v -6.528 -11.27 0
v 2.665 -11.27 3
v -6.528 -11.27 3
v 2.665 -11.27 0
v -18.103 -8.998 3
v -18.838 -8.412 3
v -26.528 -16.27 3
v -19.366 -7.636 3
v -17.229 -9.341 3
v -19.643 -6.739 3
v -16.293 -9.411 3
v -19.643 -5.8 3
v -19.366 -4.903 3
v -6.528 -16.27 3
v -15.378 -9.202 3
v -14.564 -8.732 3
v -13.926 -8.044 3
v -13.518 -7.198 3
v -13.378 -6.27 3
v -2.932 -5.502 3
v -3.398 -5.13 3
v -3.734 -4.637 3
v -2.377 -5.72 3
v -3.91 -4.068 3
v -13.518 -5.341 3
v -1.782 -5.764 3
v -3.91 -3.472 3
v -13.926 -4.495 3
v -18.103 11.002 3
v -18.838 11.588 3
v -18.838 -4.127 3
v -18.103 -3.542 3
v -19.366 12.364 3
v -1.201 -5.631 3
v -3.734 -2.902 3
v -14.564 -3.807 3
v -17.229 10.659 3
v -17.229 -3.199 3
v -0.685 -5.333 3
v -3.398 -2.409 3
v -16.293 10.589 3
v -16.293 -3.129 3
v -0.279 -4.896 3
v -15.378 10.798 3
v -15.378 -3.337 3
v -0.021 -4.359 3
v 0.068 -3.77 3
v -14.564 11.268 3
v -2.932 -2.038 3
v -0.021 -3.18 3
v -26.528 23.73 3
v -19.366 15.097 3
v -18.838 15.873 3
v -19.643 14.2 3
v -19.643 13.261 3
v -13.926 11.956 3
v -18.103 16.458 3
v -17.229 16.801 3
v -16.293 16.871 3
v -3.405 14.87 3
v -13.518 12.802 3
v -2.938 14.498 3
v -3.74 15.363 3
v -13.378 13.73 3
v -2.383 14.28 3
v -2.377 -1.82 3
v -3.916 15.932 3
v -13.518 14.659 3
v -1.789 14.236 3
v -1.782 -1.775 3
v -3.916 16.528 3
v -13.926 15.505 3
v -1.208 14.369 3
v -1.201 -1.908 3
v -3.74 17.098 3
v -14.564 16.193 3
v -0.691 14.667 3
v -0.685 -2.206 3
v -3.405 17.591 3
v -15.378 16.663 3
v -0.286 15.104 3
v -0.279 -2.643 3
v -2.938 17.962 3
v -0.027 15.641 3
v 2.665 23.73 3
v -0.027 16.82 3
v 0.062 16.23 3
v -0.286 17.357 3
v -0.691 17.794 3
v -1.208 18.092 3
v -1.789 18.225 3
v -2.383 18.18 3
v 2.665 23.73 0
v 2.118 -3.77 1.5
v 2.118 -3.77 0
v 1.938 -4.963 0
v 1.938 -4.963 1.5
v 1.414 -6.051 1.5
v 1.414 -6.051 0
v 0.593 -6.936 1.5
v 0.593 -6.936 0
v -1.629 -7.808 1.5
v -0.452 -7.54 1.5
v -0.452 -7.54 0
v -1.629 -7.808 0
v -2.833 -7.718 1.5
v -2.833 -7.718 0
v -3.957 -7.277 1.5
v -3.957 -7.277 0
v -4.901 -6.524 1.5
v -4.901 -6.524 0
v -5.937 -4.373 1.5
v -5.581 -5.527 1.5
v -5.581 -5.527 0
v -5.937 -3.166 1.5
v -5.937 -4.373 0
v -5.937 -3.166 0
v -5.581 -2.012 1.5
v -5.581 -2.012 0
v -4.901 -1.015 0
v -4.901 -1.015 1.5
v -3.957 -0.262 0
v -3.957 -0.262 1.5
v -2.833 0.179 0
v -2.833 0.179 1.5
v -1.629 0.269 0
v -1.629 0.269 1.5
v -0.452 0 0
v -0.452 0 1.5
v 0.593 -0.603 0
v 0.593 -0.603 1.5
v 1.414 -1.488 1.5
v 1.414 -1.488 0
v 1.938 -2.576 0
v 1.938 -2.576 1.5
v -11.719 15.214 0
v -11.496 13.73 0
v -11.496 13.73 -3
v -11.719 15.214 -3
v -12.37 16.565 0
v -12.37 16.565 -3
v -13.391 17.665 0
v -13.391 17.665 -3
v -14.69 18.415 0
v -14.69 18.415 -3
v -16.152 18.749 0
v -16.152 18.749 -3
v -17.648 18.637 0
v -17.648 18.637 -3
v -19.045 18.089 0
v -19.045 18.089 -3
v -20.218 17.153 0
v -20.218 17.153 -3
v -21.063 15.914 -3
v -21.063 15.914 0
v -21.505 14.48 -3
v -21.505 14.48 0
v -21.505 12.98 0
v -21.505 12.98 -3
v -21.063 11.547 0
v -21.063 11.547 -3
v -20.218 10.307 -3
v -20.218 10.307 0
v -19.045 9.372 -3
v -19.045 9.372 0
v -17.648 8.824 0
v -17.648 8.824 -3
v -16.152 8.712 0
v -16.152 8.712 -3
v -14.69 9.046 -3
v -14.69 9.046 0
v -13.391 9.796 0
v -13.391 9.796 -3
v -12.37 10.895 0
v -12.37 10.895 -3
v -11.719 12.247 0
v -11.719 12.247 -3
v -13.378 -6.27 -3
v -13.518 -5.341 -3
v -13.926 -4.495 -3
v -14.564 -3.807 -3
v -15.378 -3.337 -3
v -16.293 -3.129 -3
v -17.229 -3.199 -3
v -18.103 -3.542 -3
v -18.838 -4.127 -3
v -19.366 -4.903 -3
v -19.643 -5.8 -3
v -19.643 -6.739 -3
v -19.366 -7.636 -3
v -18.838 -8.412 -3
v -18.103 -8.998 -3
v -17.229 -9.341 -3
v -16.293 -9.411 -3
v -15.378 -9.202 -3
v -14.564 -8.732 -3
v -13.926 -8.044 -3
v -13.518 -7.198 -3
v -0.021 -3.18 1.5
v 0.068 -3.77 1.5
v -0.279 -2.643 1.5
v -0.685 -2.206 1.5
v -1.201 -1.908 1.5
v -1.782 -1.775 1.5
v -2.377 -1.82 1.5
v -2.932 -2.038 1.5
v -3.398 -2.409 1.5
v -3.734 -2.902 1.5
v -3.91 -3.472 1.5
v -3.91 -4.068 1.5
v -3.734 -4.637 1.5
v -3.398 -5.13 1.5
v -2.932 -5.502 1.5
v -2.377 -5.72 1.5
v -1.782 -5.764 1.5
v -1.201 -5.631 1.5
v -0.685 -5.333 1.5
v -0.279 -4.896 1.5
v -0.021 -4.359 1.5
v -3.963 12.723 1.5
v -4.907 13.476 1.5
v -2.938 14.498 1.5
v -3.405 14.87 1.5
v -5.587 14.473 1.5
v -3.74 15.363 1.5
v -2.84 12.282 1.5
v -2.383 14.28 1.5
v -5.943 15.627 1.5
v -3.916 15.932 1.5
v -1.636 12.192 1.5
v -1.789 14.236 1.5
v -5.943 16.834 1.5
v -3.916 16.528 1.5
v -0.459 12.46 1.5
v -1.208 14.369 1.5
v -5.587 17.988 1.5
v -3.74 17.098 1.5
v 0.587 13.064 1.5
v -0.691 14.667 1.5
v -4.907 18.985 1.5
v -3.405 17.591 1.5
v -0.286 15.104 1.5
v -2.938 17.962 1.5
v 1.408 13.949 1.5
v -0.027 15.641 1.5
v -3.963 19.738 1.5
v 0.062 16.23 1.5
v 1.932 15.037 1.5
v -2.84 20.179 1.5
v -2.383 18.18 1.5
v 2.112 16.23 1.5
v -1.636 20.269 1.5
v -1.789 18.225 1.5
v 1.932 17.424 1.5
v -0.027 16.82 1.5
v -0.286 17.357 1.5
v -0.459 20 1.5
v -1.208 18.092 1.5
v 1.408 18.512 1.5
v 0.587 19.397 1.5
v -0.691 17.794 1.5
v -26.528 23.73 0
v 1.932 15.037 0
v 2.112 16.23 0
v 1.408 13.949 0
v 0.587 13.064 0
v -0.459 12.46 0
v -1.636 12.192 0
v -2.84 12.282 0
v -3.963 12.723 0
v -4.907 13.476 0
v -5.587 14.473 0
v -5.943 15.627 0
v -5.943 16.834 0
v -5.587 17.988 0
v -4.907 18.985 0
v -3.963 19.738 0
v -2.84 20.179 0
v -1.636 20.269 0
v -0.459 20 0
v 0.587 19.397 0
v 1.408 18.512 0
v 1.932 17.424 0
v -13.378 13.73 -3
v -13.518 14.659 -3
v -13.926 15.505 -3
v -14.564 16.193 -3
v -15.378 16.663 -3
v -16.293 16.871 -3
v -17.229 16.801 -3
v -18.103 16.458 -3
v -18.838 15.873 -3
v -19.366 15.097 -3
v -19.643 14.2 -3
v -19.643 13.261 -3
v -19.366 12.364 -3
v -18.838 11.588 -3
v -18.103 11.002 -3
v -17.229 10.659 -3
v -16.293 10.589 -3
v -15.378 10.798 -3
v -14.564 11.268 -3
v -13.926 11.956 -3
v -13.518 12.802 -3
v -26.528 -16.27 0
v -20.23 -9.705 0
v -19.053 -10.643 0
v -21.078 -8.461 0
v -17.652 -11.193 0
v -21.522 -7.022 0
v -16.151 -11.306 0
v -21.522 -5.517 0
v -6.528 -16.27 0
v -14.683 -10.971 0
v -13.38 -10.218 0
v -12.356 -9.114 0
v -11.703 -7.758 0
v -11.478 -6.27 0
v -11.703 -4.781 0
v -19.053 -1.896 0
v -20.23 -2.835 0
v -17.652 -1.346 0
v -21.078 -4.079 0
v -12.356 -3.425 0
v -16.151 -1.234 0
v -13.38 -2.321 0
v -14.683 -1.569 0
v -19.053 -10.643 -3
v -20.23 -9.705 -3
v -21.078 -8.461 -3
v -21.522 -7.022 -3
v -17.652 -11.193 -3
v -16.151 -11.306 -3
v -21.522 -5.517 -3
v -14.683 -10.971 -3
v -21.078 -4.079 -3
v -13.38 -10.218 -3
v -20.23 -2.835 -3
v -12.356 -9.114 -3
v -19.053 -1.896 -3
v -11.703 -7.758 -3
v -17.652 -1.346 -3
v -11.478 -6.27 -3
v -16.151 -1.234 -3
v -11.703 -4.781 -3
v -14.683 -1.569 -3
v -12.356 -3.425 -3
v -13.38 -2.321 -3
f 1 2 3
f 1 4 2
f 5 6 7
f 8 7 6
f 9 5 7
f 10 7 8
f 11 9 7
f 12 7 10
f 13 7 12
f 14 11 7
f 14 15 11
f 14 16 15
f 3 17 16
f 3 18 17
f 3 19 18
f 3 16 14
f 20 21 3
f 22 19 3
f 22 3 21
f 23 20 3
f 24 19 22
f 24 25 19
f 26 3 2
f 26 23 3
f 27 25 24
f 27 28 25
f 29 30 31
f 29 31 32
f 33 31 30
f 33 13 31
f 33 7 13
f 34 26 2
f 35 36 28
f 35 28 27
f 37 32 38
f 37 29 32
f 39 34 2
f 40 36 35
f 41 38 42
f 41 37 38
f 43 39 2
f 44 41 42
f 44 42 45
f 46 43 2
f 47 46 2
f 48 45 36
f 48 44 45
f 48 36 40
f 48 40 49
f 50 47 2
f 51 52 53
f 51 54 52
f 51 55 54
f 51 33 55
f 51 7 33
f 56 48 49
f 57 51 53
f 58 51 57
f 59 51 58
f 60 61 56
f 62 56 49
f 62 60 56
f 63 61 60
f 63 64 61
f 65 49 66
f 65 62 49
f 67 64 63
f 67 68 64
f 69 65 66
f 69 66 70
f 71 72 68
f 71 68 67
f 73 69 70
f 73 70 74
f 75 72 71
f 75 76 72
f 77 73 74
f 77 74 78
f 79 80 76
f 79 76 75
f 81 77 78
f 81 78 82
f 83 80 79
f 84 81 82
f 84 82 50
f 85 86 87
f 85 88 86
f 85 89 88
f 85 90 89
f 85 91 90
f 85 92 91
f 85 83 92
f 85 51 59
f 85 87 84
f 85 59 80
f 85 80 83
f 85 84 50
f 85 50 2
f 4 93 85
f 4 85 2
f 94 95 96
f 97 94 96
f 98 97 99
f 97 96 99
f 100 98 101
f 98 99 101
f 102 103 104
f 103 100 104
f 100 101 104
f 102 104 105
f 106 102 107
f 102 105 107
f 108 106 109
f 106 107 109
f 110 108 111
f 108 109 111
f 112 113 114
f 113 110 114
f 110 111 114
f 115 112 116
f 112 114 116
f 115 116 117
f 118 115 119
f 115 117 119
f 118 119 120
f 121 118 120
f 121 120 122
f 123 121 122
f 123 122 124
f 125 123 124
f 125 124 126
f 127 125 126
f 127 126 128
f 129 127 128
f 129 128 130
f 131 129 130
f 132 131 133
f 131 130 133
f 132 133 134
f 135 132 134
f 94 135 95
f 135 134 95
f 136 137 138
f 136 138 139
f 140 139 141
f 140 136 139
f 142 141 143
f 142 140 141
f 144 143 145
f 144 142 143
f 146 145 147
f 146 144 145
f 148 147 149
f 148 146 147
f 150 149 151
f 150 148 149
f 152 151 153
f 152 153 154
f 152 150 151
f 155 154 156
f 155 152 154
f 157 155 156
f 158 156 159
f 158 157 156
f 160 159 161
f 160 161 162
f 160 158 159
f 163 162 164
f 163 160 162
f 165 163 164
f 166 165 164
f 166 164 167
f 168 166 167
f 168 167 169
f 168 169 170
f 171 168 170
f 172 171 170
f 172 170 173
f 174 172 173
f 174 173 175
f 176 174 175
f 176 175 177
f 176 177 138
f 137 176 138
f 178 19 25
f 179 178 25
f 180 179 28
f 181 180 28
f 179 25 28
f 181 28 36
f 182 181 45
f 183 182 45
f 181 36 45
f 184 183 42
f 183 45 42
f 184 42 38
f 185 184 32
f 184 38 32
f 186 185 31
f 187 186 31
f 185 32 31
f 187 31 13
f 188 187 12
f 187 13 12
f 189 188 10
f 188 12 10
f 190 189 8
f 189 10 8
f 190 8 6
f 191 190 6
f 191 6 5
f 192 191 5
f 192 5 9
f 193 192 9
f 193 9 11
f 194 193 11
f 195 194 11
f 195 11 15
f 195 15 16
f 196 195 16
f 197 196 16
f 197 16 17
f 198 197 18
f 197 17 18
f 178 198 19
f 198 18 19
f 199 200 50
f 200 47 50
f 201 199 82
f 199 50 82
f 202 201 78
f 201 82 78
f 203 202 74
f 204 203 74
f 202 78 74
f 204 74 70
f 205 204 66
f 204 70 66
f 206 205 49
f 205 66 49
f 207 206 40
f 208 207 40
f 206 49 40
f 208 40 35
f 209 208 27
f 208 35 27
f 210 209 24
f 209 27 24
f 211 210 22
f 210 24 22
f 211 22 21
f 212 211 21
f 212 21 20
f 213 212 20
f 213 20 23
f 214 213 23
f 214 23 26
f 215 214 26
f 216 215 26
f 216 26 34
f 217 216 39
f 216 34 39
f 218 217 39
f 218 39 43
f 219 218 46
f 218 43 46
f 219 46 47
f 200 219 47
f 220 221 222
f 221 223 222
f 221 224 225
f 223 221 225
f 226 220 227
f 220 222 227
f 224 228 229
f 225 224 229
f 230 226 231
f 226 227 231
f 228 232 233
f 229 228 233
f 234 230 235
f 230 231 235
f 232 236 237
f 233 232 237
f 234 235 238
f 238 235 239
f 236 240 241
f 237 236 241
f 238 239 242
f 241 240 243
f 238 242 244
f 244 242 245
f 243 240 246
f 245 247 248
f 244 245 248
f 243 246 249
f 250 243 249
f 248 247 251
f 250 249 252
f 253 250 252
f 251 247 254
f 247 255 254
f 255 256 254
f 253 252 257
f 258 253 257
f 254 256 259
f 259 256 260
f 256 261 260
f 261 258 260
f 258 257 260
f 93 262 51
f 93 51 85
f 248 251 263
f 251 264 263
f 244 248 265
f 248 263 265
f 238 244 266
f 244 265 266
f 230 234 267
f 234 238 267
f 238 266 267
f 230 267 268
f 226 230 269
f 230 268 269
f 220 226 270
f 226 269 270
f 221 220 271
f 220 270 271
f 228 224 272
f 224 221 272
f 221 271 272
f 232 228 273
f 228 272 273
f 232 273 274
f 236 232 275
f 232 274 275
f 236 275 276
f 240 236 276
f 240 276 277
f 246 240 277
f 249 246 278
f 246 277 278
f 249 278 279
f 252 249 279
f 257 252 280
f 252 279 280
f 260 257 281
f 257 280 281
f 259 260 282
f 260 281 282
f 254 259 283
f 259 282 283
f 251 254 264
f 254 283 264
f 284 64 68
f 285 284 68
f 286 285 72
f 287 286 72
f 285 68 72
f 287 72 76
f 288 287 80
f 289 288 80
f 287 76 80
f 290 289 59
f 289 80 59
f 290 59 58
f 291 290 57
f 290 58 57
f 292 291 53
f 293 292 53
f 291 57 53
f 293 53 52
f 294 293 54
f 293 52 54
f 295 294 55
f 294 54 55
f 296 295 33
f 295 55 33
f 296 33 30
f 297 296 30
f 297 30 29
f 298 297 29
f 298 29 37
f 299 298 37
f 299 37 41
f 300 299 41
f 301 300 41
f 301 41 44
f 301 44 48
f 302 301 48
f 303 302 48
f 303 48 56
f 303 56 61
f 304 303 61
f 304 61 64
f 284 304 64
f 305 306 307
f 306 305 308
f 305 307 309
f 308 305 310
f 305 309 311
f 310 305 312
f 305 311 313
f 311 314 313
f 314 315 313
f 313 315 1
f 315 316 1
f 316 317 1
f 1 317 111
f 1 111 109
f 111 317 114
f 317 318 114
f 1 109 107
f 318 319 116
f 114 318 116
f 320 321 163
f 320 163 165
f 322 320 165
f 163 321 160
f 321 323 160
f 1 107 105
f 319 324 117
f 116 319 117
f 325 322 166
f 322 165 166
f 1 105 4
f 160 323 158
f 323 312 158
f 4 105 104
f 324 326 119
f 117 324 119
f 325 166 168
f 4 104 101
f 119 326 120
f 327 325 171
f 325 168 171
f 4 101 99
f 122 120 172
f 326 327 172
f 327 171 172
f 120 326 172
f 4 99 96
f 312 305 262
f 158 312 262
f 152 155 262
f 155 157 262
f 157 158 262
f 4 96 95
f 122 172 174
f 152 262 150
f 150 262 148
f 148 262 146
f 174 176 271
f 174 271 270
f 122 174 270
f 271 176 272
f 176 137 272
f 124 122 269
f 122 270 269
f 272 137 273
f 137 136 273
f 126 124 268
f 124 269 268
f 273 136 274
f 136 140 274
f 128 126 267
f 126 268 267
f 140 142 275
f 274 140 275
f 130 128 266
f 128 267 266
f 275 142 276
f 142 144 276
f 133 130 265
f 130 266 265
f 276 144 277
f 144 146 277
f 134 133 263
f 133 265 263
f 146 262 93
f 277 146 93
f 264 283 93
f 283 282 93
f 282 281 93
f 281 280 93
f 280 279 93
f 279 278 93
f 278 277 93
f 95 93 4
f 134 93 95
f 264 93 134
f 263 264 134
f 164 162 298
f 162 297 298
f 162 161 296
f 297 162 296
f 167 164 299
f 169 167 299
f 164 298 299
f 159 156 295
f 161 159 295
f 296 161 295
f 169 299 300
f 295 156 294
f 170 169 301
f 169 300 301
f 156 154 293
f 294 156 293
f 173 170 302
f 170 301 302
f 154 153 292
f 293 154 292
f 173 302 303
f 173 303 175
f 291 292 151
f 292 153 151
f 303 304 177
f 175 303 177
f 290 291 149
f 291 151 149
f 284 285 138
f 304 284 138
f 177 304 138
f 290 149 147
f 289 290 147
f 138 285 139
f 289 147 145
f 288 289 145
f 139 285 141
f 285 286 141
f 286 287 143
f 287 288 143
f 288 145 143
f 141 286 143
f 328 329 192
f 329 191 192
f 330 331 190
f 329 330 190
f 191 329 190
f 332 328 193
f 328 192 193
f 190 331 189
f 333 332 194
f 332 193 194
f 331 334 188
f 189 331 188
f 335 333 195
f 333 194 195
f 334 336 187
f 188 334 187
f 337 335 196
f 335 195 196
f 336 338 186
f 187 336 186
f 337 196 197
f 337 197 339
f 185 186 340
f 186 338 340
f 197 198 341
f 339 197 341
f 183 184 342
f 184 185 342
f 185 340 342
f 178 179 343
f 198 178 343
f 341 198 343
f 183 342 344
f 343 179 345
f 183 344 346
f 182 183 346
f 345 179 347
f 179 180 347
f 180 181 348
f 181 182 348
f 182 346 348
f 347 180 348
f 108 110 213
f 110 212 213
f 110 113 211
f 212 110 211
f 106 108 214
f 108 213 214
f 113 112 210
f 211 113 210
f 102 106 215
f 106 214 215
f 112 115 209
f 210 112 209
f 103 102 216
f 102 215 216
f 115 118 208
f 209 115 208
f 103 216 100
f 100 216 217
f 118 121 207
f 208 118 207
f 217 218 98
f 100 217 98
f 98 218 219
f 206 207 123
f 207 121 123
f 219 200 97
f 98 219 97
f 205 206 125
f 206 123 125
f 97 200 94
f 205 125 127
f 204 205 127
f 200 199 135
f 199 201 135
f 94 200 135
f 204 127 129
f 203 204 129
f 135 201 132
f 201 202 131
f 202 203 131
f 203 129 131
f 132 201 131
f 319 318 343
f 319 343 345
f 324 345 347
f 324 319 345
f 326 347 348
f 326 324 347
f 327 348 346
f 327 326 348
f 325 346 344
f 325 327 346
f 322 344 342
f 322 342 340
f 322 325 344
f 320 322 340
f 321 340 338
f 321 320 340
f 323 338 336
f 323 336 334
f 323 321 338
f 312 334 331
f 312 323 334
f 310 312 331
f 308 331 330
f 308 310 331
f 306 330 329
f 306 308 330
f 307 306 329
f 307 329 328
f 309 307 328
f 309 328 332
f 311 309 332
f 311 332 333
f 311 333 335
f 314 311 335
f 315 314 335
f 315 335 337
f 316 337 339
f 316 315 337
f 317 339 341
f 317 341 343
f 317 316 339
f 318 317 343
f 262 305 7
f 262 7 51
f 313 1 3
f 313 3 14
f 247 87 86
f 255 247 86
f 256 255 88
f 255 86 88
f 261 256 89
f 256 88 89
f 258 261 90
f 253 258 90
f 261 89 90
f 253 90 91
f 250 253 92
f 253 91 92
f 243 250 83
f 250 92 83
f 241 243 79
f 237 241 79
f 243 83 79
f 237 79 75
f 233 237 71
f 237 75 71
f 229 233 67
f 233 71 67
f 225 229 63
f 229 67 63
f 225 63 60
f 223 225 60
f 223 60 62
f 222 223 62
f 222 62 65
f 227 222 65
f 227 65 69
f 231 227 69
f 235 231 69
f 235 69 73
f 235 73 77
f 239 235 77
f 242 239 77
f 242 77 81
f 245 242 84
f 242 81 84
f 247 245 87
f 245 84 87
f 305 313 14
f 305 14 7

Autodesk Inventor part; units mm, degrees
ref_plane "YZ Plane" through (0, 0, 0) normal (1, 0, 0) x (0, 1, 0)
ref_plane "XZ Plane" through (0, 0, 0) normal (0, 1, 0) x (-1, 0, 0)
ref_plane "XY Plane" through (0, 0, 0) normal (0, 0, 1) x (1, 0, 0)
sketch "Boceto1" plane through (0, 0, 0) normal (0, 0, 1) x (1, 0, 0)
  line L0 (-26.5284, 23.7303) -> (2.6646, 23.7303)
  line L1 (-6.5284, -16.2697) -> (-26.5284, -16.2697)
  line L2 (-26.5284, -16.2697) -> (-26.5284, 23.7303)
  line L3 (-26.5284, 23.7303) -> (-6.5284, 23.7303)
  line L4 (-6.5284, 23.7303) -> (-6.5284, -16.2697)
  line L5 (-6.5284, -16.2697) -> (-26.5284, -16.2697)
  line L6 (-26.5284, -16.2697) -> (-26.5284, 23.7303)
  circle A0 centre (-16.5284, 13.7303) radius 3.15
  circle A1 centre (-16.5284, -6.2697) radius 3.15
  circle A2 centre (-16.5284, -6.2697) radius 5.05
  circle A3 centre (-16.5284, 13.7303) radius 5.0326
  line L7 (-6.5284, 23.7303) -> (-1.9384, 23.7303)
  circle A4 centre (-1.9384, 16.2303) radius 2
  line L8 (-6.5284, 23.7303) -> (2.6646, 23.7303)
  line L9 (2.6646, 23.7303) -> (2.6646, -11.2697)
  line L10 (2.6646, -11.2697) -> (-6.5284, -11.2697)
  line L11 (-6.5284, -11.2697) -> (-6.5284, 23.7303)
  circle A5 centre (-1.9319, -3.7697) radius 2
  circle A6 centre (-1.9319, -3.7697) radius 4.05
  circle A7 centre (-1.9384, 16.2303) radius 4.05
  point P0 (0, 0)
  point P1 (13.9631, 1.0984)
  point P2 (-16.5284, 23.7303)
  dimension "d0" = 6.3
  dimension "d1" = 6.3
  dimension "d2" = 10
  dimension "d3" = 10
  dimension "d4" = 10.1
  dimension "d5" = 4.59
  dimension "d6" = 4
  dimension "d7" = 7.5
  dimension "d8" = 35
  dimension "d9" = 4
  dimension "d10" = 7.5
  dimension "d11" = 8.1
  dimension "d12" = 8.1
extrude "Extrusión1" add sketch "Boceto1" along normal blind 3 contours L0 L4 L1 L2 | L0 L9 L10 L4
sketch "Boceto2" plane through (0, 0, 0) normal (0, 0, -1) x (-1, 0, 0)
  point P0 (0, 0)
sketch "Boceto3" plane through (0, 0, 3) normal (0, 0, 1) x (1, 0, 0)
  circle A0 centre (-1.9384, 16.2303) radius 4.05 projected
  circle A1 centre (-1.9384, 16.2303) radius 2
  circle A2 centre (-1.9319, -3.7697) radius 4.05 projected
  circle A3 centre (-1.9319, -3.7697) radius 2
  circle A4 centre (-16.5284, -6.2697) radius 5.05 projected
  circle A5 centre (-16.5284, -6.2697) radius 3.15
  circle A6 centre (-16.5284, 13.7303) radius 5.0326 projected
  circle A7 centre (-16.5284, 13.7303) radius 3.15
  point P0 (0, 0)
  dimension "d15" = 4
  dimension "d16" = 4
  dimension "d17" = 6.3
  dimension "d18" = 6.3
extrude "Extrusión2" add sketch "Boceto3" against normal blind 1.5 contours A0 | A2
extrude "Extrusión3" add sketch "Boceto3" against normal blind 6 contours A4 | A6
properties part number "Base Rodamiento delgado"
